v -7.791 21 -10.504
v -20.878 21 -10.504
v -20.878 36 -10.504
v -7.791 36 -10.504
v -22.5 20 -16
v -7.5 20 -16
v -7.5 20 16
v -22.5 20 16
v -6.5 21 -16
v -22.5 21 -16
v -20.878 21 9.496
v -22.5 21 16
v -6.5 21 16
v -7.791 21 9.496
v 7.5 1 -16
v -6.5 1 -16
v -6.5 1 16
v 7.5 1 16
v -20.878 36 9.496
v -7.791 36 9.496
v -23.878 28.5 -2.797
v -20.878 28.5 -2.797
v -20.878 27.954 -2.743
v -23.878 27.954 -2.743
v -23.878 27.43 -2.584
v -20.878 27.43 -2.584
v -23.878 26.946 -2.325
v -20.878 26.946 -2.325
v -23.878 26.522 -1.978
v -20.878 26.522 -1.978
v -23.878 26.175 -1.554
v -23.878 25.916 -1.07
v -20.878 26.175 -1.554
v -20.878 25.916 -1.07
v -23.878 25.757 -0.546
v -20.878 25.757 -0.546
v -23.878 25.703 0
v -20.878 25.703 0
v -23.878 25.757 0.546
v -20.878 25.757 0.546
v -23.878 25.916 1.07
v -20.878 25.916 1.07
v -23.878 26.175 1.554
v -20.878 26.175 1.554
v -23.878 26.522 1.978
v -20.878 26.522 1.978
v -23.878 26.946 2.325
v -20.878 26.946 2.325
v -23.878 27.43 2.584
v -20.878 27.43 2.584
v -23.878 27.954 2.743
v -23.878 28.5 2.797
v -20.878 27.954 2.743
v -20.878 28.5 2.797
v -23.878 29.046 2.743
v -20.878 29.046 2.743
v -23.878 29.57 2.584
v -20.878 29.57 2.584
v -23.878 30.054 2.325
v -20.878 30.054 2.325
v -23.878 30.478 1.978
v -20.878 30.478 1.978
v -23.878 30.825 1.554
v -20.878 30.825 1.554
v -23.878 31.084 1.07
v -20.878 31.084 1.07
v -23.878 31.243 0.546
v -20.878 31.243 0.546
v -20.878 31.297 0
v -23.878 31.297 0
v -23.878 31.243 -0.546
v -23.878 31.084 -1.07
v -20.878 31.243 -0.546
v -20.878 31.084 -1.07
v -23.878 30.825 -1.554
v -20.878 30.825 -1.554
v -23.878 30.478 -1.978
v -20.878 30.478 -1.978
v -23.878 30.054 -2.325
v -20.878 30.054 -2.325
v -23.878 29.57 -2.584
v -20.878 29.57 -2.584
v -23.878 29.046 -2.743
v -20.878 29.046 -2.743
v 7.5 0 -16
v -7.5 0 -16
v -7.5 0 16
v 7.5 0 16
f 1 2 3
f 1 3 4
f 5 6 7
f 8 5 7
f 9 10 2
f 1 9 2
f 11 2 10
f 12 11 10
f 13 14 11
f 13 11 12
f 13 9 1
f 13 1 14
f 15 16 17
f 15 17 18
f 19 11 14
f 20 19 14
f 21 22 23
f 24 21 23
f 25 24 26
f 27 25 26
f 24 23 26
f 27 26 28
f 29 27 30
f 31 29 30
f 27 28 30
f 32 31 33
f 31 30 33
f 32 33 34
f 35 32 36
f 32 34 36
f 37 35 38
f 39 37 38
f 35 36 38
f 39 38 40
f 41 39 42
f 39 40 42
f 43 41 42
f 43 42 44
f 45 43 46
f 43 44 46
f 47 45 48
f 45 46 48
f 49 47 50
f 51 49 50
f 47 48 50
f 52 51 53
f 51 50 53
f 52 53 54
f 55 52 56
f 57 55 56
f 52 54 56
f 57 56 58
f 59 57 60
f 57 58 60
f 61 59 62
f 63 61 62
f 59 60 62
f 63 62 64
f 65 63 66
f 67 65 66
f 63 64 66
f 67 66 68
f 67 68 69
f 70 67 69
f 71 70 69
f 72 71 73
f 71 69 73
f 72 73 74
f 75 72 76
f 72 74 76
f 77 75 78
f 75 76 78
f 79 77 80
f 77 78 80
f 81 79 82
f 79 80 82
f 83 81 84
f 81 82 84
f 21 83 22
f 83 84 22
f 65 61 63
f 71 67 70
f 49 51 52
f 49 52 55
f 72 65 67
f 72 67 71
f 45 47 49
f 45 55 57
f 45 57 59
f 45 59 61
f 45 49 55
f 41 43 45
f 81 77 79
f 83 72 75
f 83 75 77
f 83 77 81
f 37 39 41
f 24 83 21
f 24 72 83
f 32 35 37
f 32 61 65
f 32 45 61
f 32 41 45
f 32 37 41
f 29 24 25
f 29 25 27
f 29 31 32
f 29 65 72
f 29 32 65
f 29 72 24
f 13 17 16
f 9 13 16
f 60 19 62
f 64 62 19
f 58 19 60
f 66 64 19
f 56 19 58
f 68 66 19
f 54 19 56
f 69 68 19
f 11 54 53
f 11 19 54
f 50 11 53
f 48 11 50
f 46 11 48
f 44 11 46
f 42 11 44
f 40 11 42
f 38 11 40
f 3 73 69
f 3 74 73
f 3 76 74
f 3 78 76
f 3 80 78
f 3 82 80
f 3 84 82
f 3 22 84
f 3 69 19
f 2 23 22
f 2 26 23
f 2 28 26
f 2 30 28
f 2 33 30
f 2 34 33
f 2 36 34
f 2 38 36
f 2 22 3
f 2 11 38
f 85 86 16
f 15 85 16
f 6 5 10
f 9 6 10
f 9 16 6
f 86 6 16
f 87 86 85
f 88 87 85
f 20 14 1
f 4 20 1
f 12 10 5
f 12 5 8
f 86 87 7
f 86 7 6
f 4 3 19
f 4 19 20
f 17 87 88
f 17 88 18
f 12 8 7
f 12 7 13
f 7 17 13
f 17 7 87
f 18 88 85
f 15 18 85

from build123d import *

# Parameters (mm, degrees)
SKETCH_1_W       = 15
SKETCH_1_H       = 32
EXTRUDE_1_DEPTH  = 1
SKETCH_2_W       = 1
SKETCH_2_H       = 32
EXTRUDE_2_DEPTH  = 20
SKETCH_8_W       = 32
SKETCH_8_H       = 1
EXTRUDE_8_DEPTH  = 15
SKETCH_9_W       = 13.087276504
SKETCH_9_H       = 20
EXTRUDE_9_DEPTH  = 15
SKETCH_10_R      = 2.796797866
EXTRUDE_10_DEPTH = 3


with BuildPart() as part:
    # 草图1 → 凸台-拉伸1 (new body)
    with BuildSketch(Plane(origin=(0, 0, 0), x_dir=(1, 0, 0), z_dir=(0, 1, 0))):
        Rectangle(SKETCH_1_W, SKETCH_1_H)
    extrude(amount=EXTRUDE_1_DEPTH)

    # 草图2 → 凸台-拉伸2 (add)
    with BuildSketch(Plane(origin=(0, 1, 0), x_dir=(1, 0, 0), z_dir=(0, 1, 0))):
        with Locations((-7, 0)):
            Rectangle(SKETCH_2_W, SKETCH_2_H)
    extrude(amount=EXTRUDE_2_DEPTH)

    # 草图8 → 凸台-拉伸8 (add)
    with BuildSketch(Plane.ZY.offset(7.5)):
        with Locations((0, 20.5)):
            Rectangle(SKETCH_8_W, SKETCH_8_H)
    extrude(amount=EXTRUDE_8_DEPTH)

    # 草图9 → 凸台-拉伸9 (add)
    with BuildSketch(Plane(origin=(0, 21, 0), x_dir=(1, 0, 0), z_dir=(0, 1, 0))):
        with Locations((-14.334681212, 0.503703775)):
            Rectangle(SKETCH_9_W, SKETCH_9_H)
    extrude(amount=EXTRUDE_9_DEPTH)

    # 草图10 → 凸台-拉伸10 (add)
    with BuildSketch(Plane.ZY.offset(20.878319464)):
        with Locations(Location((0, 28.5, 0), (0, 0, 180))):
            Circle(SKETCH_10_R)
    extrude(amount=EXTRUDE_10_DEPTH)


solid = part.part
